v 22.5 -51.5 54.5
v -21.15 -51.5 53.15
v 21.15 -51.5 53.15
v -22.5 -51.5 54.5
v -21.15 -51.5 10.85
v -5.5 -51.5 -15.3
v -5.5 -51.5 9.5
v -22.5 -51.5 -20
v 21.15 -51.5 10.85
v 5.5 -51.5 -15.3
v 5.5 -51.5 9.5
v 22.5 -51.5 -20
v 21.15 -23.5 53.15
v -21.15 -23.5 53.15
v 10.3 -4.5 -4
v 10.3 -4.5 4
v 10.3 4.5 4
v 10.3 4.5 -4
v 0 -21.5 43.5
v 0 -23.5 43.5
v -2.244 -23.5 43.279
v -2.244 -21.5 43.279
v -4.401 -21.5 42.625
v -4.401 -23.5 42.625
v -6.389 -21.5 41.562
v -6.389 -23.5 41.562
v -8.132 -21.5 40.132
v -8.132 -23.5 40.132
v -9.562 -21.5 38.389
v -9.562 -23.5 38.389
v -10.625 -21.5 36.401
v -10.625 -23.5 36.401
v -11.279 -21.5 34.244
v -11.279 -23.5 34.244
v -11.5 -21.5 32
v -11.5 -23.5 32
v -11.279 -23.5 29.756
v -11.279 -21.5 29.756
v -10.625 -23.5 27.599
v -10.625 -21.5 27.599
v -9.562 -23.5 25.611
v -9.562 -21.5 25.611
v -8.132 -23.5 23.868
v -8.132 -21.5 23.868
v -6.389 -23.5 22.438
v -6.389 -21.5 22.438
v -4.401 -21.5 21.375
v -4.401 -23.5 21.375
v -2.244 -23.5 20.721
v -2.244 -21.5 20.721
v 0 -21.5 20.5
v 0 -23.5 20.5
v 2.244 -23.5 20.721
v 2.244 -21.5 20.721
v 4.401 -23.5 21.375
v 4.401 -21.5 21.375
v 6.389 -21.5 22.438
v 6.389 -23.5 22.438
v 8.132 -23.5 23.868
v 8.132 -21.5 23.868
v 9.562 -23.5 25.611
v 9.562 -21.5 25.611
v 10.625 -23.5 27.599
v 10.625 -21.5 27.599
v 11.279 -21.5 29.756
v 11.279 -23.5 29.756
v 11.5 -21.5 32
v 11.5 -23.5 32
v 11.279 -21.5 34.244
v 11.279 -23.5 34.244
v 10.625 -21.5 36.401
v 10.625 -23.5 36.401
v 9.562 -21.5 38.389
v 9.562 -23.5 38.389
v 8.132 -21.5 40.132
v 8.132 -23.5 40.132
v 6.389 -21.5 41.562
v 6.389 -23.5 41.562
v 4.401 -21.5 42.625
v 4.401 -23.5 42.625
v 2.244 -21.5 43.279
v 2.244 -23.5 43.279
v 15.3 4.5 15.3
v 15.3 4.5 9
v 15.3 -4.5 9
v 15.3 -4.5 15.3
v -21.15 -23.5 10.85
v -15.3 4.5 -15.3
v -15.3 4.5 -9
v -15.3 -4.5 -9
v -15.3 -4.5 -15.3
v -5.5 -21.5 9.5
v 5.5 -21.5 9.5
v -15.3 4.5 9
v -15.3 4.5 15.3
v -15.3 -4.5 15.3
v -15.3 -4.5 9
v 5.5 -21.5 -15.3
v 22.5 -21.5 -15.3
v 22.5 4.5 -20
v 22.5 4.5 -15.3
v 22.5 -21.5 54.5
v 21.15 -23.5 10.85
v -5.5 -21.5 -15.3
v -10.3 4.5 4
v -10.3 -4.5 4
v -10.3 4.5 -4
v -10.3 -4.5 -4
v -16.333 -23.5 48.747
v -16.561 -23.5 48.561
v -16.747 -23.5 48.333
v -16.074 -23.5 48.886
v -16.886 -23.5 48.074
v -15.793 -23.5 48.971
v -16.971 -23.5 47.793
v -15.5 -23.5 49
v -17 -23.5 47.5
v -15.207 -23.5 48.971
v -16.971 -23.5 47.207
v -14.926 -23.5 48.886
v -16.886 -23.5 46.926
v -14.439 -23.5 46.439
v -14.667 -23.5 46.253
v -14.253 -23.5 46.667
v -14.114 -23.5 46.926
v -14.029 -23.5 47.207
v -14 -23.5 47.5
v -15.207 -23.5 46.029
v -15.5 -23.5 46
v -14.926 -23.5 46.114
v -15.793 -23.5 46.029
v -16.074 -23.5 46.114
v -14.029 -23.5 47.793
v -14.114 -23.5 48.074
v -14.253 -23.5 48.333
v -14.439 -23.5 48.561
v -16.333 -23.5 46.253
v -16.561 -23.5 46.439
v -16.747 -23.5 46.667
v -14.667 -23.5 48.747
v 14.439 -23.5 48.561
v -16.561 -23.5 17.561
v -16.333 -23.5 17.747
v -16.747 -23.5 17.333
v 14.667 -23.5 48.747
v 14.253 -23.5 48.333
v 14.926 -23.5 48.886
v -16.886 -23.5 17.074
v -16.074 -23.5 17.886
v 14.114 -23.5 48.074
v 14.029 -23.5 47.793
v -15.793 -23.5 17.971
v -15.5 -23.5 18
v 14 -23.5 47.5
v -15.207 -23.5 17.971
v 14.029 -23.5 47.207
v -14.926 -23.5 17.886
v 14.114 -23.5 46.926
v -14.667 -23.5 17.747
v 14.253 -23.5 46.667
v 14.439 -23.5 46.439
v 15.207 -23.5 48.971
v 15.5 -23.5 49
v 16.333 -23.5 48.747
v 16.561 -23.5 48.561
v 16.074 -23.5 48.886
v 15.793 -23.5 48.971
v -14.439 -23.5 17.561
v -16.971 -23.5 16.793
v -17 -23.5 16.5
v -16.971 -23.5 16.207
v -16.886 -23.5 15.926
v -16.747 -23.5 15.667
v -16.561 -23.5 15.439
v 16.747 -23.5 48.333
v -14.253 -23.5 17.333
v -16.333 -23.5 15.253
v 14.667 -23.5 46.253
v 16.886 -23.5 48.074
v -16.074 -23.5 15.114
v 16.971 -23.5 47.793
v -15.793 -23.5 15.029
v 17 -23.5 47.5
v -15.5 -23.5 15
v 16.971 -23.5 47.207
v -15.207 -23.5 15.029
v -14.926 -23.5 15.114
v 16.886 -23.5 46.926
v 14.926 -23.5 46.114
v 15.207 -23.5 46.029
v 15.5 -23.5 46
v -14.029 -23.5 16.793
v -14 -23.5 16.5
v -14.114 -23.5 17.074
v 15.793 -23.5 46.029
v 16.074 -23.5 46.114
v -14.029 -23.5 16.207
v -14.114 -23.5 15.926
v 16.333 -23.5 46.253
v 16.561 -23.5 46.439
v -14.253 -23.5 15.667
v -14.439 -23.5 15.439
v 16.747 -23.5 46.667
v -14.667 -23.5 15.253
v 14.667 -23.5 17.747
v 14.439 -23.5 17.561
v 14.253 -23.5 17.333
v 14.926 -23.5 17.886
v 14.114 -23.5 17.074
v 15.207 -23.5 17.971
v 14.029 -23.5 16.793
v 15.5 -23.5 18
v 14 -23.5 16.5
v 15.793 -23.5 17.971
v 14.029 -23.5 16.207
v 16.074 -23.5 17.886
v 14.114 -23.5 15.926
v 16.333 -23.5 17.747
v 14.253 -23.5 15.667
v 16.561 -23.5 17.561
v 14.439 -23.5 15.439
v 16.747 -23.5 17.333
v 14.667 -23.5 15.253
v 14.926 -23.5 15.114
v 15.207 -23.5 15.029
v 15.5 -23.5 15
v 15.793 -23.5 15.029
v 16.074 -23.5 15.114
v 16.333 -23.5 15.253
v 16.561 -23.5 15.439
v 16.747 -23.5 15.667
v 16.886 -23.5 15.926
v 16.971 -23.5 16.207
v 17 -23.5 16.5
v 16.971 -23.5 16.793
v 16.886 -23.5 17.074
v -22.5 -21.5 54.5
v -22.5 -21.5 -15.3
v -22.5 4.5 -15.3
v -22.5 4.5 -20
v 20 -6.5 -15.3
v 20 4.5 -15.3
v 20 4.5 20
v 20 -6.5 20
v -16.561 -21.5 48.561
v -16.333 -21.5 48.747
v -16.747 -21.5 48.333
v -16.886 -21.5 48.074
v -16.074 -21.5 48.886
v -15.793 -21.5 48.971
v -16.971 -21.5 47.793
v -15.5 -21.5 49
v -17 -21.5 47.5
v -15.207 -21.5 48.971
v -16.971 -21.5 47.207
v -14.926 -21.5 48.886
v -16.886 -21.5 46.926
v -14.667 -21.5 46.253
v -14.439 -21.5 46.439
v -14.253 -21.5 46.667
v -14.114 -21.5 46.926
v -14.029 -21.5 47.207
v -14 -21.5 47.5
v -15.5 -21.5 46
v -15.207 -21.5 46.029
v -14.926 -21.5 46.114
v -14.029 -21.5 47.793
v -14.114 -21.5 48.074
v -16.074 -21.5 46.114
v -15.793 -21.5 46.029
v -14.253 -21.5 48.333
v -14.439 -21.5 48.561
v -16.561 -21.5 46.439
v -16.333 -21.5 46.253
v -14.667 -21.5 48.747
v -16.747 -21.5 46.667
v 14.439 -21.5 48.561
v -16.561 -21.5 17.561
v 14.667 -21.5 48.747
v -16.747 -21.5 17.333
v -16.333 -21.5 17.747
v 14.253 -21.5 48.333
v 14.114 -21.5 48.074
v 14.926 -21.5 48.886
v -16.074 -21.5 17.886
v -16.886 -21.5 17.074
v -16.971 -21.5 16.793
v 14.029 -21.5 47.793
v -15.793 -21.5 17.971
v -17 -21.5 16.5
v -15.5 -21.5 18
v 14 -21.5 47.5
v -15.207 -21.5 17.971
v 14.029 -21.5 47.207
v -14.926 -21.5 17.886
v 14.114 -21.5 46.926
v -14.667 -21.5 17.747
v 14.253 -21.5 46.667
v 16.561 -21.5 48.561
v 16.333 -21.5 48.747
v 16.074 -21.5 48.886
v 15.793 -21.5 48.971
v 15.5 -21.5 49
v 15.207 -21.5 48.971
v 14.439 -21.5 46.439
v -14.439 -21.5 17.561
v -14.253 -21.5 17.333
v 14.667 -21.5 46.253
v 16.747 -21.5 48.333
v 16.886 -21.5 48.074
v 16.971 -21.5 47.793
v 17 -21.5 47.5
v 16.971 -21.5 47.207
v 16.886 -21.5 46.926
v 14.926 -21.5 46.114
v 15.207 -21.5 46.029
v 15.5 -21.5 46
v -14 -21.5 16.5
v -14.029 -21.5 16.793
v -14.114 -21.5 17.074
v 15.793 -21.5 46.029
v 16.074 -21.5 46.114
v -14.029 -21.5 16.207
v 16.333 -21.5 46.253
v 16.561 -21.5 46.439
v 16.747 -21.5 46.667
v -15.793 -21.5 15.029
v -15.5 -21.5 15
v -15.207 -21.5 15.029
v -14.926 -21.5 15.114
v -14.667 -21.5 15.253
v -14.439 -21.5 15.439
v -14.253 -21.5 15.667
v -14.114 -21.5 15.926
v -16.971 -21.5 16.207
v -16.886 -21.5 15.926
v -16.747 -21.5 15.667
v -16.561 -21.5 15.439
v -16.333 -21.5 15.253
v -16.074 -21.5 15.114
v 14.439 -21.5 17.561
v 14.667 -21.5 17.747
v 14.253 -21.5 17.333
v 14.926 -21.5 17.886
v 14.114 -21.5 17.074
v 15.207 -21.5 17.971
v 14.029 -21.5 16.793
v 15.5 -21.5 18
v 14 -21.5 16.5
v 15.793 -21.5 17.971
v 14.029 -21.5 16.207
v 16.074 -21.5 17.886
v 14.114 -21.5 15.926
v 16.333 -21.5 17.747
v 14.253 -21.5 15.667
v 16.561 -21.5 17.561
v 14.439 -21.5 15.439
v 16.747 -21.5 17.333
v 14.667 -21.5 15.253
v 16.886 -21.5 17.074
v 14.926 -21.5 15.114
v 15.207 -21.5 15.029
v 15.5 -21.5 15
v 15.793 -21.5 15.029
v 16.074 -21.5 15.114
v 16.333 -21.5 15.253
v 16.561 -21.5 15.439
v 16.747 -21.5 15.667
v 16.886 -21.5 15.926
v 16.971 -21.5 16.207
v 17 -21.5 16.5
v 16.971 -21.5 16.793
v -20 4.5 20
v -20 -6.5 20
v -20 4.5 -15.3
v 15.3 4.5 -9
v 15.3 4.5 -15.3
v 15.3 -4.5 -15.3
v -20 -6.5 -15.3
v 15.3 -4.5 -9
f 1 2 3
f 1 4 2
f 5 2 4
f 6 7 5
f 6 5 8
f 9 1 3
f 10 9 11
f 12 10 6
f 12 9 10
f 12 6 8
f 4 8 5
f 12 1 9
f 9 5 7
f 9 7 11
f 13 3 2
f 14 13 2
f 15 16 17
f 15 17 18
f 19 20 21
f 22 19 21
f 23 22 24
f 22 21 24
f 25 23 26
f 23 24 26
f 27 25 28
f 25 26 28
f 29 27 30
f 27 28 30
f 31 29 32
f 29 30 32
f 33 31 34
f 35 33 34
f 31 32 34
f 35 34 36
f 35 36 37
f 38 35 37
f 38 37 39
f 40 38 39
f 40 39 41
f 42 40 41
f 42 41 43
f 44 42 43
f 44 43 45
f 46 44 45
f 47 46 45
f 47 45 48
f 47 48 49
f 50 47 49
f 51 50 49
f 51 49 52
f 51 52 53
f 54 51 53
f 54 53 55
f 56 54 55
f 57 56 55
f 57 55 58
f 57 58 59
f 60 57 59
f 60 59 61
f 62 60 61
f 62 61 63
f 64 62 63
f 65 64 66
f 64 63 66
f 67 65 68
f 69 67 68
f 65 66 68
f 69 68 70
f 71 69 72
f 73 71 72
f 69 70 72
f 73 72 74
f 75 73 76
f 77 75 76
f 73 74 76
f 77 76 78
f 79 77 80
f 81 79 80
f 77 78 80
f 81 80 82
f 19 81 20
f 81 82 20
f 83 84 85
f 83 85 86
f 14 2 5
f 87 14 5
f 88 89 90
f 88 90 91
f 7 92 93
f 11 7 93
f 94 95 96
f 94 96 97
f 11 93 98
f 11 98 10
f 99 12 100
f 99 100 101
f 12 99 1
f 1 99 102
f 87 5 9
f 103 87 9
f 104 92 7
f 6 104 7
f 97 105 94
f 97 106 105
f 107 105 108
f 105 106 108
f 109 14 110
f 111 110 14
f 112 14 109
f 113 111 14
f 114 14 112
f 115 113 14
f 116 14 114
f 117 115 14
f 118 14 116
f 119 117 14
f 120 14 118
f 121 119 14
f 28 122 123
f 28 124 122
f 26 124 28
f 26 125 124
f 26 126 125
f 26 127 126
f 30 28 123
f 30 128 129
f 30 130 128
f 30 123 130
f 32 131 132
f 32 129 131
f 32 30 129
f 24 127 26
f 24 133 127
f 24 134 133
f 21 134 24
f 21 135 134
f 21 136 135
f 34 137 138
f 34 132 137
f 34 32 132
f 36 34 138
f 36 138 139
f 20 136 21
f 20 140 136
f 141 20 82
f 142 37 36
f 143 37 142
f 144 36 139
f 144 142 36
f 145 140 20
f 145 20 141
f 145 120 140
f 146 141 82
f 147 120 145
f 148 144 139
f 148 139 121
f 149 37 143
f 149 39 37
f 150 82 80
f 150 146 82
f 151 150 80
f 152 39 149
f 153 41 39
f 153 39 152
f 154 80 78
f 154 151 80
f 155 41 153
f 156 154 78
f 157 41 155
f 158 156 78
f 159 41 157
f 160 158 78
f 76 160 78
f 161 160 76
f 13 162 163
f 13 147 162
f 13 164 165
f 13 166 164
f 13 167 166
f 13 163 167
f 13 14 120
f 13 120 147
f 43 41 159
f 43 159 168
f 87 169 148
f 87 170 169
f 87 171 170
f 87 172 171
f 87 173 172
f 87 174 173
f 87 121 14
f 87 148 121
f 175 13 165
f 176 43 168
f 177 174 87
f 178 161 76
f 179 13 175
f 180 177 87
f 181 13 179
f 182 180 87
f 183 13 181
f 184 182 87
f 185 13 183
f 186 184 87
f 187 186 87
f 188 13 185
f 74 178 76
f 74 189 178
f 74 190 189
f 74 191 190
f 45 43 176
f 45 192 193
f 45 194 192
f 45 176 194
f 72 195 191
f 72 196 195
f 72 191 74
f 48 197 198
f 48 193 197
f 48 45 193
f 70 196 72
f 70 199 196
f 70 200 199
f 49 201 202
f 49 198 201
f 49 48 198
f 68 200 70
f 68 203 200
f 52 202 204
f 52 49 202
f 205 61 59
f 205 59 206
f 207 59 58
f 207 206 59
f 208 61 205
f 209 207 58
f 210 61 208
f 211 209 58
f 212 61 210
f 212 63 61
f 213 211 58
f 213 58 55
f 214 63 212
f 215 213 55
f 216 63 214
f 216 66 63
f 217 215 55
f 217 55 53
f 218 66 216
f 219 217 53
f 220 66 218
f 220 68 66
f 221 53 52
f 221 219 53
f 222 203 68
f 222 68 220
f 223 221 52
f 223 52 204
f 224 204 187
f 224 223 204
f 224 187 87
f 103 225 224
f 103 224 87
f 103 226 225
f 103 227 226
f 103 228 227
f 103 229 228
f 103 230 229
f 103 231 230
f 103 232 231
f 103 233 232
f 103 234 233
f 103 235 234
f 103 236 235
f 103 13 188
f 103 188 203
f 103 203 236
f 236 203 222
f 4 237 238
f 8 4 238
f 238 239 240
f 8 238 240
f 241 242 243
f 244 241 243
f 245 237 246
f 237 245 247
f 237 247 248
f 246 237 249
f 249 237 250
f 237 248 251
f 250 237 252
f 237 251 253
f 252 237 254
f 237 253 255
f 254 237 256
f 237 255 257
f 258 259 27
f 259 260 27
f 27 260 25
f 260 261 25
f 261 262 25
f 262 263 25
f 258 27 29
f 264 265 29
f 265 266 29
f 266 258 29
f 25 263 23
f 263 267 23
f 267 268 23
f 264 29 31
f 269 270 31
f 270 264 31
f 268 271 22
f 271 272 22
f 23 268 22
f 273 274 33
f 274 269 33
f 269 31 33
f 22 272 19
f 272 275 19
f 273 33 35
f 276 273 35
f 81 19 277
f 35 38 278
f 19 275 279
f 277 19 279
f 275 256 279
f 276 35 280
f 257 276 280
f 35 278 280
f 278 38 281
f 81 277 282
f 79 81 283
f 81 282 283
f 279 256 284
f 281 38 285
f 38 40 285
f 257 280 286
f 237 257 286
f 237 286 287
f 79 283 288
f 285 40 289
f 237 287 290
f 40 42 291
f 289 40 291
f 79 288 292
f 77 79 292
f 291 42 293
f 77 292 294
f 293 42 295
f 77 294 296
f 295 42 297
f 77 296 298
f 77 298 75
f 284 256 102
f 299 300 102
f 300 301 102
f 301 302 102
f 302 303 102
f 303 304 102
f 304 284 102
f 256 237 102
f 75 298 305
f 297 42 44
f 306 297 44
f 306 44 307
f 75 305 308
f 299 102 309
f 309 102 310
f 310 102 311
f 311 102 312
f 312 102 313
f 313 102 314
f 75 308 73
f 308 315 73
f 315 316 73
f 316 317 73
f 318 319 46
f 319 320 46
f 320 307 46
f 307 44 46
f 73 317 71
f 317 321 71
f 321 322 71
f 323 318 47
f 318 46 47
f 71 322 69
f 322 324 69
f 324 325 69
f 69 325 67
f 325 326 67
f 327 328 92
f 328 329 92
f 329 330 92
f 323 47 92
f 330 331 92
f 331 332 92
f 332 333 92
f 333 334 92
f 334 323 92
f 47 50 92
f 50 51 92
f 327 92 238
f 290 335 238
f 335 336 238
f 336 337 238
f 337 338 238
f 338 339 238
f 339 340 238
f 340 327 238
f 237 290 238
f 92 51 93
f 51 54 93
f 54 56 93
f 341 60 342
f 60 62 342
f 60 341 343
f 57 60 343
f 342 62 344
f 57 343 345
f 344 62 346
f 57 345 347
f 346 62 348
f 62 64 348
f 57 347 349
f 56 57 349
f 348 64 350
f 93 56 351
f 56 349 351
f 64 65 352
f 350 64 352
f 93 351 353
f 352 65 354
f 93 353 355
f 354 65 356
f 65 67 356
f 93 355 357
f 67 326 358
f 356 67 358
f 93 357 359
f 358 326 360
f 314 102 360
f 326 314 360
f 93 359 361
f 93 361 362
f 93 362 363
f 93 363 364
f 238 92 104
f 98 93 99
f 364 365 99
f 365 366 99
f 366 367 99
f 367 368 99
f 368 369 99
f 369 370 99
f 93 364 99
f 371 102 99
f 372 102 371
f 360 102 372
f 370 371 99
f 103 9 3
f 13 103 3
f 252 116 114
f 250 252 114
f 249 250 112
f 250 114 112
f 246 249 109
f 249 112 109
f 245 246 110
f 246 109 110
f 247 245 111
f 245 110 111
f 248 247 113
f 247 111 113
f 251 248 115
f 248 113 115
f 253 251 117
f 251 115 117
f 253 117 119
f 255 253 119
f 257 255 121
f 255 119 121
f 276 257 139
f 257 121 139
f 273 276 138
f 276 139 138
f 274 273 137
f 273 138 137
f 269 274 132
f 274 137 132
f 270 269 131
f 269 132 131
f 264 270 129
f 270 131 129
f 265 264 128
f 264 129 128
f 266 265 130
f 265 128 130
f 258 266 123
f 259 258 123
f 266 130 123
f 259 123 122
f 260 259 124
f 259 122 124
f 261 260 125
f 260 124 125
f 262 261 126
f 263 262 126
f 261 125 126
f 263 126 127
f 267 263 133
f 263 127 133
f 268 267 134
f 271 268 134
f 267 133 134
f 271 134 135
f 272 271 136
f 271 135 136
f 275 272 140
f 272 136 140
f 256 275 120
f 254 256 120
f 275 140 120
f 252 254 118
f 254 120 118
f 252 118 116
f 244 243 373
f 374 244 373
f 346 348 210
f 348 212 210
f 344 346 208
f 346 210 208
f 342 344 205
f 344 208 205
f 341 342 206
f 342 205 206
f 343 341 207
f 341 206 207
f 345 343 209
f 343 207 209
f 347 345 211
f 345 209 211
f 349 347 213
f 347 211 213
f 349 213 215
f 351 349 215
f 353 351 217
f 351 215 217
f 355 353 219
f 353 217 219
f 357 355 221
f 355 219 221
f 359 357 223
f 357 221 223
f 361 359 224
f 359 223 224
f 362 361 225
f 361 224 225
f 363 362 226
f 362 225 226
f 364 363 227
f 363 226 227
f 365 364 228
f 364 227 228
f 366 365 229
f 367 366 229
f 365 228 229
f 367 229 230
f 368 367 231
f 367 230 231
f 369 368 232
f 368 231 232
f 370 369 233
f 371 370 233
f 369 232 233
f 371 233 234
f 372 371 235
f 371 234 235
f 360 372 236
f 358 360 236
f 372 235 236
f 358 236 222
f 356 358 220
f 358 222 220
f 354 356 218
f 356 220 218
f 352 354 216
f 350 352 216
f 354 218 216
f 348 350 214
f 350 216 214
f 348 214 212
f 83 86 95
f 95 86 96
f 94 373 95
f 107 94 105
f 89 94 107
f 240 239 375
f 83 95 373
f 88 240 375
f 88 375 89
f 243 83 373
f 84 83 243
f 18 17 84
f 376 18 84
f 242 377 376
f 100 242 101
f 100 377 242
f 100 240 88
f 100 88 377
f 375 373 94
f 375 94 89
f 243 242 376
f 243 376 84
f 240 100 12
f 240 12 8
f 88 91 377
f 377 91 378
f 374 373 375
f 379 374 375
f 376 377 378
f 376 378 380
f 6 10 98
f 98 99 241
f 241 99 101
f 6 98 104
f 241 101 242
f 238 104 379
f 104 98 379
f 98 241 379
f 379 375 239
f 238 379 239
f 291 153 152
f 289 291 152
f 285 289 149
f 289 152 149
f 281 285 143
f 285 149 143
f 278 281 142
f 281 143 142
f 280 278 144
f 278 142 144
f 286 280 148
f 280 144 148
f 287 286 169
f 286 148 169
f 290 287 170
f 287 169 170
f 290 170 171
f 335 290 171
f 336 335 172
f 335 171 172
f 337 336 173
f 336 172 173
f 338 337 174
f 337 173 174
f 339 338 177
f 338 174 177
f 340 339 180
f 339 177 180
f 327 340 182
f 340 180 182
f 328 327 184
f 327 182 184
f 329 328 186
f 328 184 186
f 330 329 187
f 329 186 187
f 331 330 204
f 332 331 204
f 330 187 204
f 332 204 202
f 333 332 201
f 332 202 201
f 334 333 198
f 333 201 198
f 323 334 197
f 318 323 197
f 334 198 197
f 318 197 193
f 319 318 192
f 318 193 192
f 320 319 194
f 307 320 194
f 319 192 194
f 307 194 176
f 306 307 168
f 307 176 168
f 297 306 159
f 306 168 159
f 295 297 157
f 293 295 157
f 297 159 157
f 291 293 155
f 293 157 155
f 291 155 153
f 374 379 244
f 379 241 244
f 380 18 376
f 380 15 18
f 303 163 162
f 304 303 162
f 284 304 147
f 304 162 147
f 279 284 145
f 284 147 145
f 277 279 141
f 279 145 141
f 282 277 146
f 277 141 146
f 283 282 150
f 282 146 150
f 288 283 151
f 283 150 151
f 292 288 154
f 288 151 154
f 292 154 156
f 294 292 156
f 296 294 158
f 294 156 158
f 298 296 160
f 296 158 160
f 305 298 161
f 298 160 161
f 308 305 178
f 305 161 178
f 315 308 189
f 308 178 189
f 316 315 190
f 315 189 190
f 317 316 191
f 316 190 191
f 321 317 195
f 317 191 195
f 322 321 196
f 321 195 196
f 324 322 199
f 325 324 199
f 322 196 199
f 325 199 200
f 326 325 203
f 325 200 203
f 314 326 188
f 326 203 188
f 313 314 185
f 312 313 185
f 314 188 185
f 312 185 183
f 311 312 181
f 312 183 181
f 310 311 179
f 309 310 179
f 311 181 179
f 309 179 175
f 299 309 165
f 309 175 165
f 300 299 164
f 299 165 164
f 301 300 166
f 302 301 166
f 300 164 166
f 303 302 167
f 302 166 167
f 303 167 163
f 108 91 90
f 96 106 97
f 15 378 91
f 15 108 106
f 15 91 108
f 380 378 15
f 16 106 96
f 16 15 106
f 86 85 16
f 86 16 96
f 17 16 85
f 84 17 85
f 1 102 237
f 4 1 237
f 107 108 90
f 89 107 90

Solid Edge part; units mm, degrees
sketch "Sketch1" plane through (0, 0, 0) normal (0, -1, 0) x (1, 0, 0)
  line L0 (-20, -20) -> (20, -20)
  line L1 (20, -20) -> (20, 20)
  line L2 (20, 20) -> (-20, 20)
  line L3 (-20, 20) -> (-20, -20)
extrude "Protrusion1" add sketch "Sketch1" along normal mid plane 9
sketch "Sketch2" plane through (0, -4.5, 0) normal (0, -1, 0) x (1, 0, 0)
  line L0 (-15.3, -15.3) -> (15.3, -15.3)
  line L1 (15.3, -15.3) -> (15.3, -9)
  line L2 (10.3, -4) -> (15.3, -9)
  line L3 (10.3, 4) -> (10.3, -4)
  line L4 (10.3, 4) -> (15.3, 9)
  line L5 (15.3, 9) -> (15.3, 15.3)
  line L6 (15.3, 15.3) -> (-15.3, 15.3)
  line L7 (-15.3, 15.3) -> (-15.3, 9)
  line L8 (-10.3, 4) -> (-15.3, 9)
  line L9 (-10.3, 4) -> (-10.3, -4)
  line L10 (-10.3, -4) -> (-15.3, -9)
  line L11 (-15.3, -9) -> (-15.3, -15.3)
extrude "ExtrudedCutout_1" cut sketch "Sketch2" against normal blind 161.5
sketch "Sketch3" plane through (0, -21.5, 0) normal (0, -1, 0) x (0, 0, 1)
  line L0 (54.5, -22.5) -> (54.5, 22.5)
  line L1 (54.5, 22.5) -> (9.5, 22.5)
  line L2 (9.5, 22.5) -> (9.5, -22.5)
  line L3 (9.5, -22.5) -> (54.5, -22.5)
  dimension "D1" = 12
extrude "ExtrudedProtrusion_8" add sketch "Sketch3" along normal blind 30
sketch "Sketch4" plane through (0, -36.5, 32) normal (0, -1, 0) x (1, 0, 0)
  line L0 (-21.15, -21.15) -> (21.15, -21.15)
  line L1 (21.15, -21.15) -> (21.15, 21.15)
  line L2 (21.15, 21.15) -> (-21.15, 21.15)
  line L3 (-21.15, 21.15) -> (-21.15, -21.15)
extrude "ExtrudedCutout_4" cut sketch "Sketch4" against normal blind 13 and the other way blind 20
sketch "Sketch5" plane through (0, -23.5, 32) normal (0, -1, 0) x (0, 0, 1)
  circle A0 centre (0, 0) radius 11.5
  circle A1 centre (-15.5, 15.5) radius 1.5
  circle A2 centre (-15.5, -15.5) radius 1.5
  circle A3 centre (15.5, 15.5) radius 1.5
  circle A4 centre (15.5, -15.5) radius 1.5
  dimension "D1" = 15.5
  dimension "D2" = 5.65
extrude "Cutout1" cut sketch "Sketch5" against normal up to next
sketch "Sketch6" plane through (0, -4.5, 0) normal (0, -1, 0) x (1, 0, 0)
  line L0 (-20, 20) -> (20, 20)
  line L1 (20, 20) -> (20, -20)
  line L2 (20, -20) -> (-20, -20)
  line L3 (-20, -20) -> (-20, 20)
extrude "ExtrudedProtrusion_9" add sketch "Sketch6" along normal blind 2
sketch "Sketch7" plane through (0, -36.5, 9.5) normal (0, 0, -1) x (1, 0, 0)
  line L0 (-22.5, 15) -> (-22.5, -15)
  line L1 (-22.5, -15) -> (-5.5, -15)
  line L2 (-5.5, -15) -> (-5.5, 15)
  line L3 (-5.5, 15) -> (-22.5, 15)
  line L4 (22.5, 15) -> (22.5, -15)
  line L5 (22.5, -15) -> (5.5, -15)
  line L6 (5.5, -15) -> (5.5, 15)
  line L7 (5.5, 15) -> (22.5, 15)
extrude "ExtrudedProtrusion_13" add sketch "Sketch7" along normal blind 29
sketch "Sketch8" plane through (0, -1, -20) normal (0, 0, -1) x (0, -1, 0)
  line L0 (50.5, 22.5) -> (-5.5, 22.5)
  line L1 (-5.5, 22.5) -> (-5.5, -22.5)
  line L2 (-5.5, -22.5) -> (50.5, -22.5)
  line L3 (50.5, -22.5) -> (50.5, 22.5)
extrude "ExtrudedProtrusion_14" add sketch "Sketch8" against normal blind 4.7
